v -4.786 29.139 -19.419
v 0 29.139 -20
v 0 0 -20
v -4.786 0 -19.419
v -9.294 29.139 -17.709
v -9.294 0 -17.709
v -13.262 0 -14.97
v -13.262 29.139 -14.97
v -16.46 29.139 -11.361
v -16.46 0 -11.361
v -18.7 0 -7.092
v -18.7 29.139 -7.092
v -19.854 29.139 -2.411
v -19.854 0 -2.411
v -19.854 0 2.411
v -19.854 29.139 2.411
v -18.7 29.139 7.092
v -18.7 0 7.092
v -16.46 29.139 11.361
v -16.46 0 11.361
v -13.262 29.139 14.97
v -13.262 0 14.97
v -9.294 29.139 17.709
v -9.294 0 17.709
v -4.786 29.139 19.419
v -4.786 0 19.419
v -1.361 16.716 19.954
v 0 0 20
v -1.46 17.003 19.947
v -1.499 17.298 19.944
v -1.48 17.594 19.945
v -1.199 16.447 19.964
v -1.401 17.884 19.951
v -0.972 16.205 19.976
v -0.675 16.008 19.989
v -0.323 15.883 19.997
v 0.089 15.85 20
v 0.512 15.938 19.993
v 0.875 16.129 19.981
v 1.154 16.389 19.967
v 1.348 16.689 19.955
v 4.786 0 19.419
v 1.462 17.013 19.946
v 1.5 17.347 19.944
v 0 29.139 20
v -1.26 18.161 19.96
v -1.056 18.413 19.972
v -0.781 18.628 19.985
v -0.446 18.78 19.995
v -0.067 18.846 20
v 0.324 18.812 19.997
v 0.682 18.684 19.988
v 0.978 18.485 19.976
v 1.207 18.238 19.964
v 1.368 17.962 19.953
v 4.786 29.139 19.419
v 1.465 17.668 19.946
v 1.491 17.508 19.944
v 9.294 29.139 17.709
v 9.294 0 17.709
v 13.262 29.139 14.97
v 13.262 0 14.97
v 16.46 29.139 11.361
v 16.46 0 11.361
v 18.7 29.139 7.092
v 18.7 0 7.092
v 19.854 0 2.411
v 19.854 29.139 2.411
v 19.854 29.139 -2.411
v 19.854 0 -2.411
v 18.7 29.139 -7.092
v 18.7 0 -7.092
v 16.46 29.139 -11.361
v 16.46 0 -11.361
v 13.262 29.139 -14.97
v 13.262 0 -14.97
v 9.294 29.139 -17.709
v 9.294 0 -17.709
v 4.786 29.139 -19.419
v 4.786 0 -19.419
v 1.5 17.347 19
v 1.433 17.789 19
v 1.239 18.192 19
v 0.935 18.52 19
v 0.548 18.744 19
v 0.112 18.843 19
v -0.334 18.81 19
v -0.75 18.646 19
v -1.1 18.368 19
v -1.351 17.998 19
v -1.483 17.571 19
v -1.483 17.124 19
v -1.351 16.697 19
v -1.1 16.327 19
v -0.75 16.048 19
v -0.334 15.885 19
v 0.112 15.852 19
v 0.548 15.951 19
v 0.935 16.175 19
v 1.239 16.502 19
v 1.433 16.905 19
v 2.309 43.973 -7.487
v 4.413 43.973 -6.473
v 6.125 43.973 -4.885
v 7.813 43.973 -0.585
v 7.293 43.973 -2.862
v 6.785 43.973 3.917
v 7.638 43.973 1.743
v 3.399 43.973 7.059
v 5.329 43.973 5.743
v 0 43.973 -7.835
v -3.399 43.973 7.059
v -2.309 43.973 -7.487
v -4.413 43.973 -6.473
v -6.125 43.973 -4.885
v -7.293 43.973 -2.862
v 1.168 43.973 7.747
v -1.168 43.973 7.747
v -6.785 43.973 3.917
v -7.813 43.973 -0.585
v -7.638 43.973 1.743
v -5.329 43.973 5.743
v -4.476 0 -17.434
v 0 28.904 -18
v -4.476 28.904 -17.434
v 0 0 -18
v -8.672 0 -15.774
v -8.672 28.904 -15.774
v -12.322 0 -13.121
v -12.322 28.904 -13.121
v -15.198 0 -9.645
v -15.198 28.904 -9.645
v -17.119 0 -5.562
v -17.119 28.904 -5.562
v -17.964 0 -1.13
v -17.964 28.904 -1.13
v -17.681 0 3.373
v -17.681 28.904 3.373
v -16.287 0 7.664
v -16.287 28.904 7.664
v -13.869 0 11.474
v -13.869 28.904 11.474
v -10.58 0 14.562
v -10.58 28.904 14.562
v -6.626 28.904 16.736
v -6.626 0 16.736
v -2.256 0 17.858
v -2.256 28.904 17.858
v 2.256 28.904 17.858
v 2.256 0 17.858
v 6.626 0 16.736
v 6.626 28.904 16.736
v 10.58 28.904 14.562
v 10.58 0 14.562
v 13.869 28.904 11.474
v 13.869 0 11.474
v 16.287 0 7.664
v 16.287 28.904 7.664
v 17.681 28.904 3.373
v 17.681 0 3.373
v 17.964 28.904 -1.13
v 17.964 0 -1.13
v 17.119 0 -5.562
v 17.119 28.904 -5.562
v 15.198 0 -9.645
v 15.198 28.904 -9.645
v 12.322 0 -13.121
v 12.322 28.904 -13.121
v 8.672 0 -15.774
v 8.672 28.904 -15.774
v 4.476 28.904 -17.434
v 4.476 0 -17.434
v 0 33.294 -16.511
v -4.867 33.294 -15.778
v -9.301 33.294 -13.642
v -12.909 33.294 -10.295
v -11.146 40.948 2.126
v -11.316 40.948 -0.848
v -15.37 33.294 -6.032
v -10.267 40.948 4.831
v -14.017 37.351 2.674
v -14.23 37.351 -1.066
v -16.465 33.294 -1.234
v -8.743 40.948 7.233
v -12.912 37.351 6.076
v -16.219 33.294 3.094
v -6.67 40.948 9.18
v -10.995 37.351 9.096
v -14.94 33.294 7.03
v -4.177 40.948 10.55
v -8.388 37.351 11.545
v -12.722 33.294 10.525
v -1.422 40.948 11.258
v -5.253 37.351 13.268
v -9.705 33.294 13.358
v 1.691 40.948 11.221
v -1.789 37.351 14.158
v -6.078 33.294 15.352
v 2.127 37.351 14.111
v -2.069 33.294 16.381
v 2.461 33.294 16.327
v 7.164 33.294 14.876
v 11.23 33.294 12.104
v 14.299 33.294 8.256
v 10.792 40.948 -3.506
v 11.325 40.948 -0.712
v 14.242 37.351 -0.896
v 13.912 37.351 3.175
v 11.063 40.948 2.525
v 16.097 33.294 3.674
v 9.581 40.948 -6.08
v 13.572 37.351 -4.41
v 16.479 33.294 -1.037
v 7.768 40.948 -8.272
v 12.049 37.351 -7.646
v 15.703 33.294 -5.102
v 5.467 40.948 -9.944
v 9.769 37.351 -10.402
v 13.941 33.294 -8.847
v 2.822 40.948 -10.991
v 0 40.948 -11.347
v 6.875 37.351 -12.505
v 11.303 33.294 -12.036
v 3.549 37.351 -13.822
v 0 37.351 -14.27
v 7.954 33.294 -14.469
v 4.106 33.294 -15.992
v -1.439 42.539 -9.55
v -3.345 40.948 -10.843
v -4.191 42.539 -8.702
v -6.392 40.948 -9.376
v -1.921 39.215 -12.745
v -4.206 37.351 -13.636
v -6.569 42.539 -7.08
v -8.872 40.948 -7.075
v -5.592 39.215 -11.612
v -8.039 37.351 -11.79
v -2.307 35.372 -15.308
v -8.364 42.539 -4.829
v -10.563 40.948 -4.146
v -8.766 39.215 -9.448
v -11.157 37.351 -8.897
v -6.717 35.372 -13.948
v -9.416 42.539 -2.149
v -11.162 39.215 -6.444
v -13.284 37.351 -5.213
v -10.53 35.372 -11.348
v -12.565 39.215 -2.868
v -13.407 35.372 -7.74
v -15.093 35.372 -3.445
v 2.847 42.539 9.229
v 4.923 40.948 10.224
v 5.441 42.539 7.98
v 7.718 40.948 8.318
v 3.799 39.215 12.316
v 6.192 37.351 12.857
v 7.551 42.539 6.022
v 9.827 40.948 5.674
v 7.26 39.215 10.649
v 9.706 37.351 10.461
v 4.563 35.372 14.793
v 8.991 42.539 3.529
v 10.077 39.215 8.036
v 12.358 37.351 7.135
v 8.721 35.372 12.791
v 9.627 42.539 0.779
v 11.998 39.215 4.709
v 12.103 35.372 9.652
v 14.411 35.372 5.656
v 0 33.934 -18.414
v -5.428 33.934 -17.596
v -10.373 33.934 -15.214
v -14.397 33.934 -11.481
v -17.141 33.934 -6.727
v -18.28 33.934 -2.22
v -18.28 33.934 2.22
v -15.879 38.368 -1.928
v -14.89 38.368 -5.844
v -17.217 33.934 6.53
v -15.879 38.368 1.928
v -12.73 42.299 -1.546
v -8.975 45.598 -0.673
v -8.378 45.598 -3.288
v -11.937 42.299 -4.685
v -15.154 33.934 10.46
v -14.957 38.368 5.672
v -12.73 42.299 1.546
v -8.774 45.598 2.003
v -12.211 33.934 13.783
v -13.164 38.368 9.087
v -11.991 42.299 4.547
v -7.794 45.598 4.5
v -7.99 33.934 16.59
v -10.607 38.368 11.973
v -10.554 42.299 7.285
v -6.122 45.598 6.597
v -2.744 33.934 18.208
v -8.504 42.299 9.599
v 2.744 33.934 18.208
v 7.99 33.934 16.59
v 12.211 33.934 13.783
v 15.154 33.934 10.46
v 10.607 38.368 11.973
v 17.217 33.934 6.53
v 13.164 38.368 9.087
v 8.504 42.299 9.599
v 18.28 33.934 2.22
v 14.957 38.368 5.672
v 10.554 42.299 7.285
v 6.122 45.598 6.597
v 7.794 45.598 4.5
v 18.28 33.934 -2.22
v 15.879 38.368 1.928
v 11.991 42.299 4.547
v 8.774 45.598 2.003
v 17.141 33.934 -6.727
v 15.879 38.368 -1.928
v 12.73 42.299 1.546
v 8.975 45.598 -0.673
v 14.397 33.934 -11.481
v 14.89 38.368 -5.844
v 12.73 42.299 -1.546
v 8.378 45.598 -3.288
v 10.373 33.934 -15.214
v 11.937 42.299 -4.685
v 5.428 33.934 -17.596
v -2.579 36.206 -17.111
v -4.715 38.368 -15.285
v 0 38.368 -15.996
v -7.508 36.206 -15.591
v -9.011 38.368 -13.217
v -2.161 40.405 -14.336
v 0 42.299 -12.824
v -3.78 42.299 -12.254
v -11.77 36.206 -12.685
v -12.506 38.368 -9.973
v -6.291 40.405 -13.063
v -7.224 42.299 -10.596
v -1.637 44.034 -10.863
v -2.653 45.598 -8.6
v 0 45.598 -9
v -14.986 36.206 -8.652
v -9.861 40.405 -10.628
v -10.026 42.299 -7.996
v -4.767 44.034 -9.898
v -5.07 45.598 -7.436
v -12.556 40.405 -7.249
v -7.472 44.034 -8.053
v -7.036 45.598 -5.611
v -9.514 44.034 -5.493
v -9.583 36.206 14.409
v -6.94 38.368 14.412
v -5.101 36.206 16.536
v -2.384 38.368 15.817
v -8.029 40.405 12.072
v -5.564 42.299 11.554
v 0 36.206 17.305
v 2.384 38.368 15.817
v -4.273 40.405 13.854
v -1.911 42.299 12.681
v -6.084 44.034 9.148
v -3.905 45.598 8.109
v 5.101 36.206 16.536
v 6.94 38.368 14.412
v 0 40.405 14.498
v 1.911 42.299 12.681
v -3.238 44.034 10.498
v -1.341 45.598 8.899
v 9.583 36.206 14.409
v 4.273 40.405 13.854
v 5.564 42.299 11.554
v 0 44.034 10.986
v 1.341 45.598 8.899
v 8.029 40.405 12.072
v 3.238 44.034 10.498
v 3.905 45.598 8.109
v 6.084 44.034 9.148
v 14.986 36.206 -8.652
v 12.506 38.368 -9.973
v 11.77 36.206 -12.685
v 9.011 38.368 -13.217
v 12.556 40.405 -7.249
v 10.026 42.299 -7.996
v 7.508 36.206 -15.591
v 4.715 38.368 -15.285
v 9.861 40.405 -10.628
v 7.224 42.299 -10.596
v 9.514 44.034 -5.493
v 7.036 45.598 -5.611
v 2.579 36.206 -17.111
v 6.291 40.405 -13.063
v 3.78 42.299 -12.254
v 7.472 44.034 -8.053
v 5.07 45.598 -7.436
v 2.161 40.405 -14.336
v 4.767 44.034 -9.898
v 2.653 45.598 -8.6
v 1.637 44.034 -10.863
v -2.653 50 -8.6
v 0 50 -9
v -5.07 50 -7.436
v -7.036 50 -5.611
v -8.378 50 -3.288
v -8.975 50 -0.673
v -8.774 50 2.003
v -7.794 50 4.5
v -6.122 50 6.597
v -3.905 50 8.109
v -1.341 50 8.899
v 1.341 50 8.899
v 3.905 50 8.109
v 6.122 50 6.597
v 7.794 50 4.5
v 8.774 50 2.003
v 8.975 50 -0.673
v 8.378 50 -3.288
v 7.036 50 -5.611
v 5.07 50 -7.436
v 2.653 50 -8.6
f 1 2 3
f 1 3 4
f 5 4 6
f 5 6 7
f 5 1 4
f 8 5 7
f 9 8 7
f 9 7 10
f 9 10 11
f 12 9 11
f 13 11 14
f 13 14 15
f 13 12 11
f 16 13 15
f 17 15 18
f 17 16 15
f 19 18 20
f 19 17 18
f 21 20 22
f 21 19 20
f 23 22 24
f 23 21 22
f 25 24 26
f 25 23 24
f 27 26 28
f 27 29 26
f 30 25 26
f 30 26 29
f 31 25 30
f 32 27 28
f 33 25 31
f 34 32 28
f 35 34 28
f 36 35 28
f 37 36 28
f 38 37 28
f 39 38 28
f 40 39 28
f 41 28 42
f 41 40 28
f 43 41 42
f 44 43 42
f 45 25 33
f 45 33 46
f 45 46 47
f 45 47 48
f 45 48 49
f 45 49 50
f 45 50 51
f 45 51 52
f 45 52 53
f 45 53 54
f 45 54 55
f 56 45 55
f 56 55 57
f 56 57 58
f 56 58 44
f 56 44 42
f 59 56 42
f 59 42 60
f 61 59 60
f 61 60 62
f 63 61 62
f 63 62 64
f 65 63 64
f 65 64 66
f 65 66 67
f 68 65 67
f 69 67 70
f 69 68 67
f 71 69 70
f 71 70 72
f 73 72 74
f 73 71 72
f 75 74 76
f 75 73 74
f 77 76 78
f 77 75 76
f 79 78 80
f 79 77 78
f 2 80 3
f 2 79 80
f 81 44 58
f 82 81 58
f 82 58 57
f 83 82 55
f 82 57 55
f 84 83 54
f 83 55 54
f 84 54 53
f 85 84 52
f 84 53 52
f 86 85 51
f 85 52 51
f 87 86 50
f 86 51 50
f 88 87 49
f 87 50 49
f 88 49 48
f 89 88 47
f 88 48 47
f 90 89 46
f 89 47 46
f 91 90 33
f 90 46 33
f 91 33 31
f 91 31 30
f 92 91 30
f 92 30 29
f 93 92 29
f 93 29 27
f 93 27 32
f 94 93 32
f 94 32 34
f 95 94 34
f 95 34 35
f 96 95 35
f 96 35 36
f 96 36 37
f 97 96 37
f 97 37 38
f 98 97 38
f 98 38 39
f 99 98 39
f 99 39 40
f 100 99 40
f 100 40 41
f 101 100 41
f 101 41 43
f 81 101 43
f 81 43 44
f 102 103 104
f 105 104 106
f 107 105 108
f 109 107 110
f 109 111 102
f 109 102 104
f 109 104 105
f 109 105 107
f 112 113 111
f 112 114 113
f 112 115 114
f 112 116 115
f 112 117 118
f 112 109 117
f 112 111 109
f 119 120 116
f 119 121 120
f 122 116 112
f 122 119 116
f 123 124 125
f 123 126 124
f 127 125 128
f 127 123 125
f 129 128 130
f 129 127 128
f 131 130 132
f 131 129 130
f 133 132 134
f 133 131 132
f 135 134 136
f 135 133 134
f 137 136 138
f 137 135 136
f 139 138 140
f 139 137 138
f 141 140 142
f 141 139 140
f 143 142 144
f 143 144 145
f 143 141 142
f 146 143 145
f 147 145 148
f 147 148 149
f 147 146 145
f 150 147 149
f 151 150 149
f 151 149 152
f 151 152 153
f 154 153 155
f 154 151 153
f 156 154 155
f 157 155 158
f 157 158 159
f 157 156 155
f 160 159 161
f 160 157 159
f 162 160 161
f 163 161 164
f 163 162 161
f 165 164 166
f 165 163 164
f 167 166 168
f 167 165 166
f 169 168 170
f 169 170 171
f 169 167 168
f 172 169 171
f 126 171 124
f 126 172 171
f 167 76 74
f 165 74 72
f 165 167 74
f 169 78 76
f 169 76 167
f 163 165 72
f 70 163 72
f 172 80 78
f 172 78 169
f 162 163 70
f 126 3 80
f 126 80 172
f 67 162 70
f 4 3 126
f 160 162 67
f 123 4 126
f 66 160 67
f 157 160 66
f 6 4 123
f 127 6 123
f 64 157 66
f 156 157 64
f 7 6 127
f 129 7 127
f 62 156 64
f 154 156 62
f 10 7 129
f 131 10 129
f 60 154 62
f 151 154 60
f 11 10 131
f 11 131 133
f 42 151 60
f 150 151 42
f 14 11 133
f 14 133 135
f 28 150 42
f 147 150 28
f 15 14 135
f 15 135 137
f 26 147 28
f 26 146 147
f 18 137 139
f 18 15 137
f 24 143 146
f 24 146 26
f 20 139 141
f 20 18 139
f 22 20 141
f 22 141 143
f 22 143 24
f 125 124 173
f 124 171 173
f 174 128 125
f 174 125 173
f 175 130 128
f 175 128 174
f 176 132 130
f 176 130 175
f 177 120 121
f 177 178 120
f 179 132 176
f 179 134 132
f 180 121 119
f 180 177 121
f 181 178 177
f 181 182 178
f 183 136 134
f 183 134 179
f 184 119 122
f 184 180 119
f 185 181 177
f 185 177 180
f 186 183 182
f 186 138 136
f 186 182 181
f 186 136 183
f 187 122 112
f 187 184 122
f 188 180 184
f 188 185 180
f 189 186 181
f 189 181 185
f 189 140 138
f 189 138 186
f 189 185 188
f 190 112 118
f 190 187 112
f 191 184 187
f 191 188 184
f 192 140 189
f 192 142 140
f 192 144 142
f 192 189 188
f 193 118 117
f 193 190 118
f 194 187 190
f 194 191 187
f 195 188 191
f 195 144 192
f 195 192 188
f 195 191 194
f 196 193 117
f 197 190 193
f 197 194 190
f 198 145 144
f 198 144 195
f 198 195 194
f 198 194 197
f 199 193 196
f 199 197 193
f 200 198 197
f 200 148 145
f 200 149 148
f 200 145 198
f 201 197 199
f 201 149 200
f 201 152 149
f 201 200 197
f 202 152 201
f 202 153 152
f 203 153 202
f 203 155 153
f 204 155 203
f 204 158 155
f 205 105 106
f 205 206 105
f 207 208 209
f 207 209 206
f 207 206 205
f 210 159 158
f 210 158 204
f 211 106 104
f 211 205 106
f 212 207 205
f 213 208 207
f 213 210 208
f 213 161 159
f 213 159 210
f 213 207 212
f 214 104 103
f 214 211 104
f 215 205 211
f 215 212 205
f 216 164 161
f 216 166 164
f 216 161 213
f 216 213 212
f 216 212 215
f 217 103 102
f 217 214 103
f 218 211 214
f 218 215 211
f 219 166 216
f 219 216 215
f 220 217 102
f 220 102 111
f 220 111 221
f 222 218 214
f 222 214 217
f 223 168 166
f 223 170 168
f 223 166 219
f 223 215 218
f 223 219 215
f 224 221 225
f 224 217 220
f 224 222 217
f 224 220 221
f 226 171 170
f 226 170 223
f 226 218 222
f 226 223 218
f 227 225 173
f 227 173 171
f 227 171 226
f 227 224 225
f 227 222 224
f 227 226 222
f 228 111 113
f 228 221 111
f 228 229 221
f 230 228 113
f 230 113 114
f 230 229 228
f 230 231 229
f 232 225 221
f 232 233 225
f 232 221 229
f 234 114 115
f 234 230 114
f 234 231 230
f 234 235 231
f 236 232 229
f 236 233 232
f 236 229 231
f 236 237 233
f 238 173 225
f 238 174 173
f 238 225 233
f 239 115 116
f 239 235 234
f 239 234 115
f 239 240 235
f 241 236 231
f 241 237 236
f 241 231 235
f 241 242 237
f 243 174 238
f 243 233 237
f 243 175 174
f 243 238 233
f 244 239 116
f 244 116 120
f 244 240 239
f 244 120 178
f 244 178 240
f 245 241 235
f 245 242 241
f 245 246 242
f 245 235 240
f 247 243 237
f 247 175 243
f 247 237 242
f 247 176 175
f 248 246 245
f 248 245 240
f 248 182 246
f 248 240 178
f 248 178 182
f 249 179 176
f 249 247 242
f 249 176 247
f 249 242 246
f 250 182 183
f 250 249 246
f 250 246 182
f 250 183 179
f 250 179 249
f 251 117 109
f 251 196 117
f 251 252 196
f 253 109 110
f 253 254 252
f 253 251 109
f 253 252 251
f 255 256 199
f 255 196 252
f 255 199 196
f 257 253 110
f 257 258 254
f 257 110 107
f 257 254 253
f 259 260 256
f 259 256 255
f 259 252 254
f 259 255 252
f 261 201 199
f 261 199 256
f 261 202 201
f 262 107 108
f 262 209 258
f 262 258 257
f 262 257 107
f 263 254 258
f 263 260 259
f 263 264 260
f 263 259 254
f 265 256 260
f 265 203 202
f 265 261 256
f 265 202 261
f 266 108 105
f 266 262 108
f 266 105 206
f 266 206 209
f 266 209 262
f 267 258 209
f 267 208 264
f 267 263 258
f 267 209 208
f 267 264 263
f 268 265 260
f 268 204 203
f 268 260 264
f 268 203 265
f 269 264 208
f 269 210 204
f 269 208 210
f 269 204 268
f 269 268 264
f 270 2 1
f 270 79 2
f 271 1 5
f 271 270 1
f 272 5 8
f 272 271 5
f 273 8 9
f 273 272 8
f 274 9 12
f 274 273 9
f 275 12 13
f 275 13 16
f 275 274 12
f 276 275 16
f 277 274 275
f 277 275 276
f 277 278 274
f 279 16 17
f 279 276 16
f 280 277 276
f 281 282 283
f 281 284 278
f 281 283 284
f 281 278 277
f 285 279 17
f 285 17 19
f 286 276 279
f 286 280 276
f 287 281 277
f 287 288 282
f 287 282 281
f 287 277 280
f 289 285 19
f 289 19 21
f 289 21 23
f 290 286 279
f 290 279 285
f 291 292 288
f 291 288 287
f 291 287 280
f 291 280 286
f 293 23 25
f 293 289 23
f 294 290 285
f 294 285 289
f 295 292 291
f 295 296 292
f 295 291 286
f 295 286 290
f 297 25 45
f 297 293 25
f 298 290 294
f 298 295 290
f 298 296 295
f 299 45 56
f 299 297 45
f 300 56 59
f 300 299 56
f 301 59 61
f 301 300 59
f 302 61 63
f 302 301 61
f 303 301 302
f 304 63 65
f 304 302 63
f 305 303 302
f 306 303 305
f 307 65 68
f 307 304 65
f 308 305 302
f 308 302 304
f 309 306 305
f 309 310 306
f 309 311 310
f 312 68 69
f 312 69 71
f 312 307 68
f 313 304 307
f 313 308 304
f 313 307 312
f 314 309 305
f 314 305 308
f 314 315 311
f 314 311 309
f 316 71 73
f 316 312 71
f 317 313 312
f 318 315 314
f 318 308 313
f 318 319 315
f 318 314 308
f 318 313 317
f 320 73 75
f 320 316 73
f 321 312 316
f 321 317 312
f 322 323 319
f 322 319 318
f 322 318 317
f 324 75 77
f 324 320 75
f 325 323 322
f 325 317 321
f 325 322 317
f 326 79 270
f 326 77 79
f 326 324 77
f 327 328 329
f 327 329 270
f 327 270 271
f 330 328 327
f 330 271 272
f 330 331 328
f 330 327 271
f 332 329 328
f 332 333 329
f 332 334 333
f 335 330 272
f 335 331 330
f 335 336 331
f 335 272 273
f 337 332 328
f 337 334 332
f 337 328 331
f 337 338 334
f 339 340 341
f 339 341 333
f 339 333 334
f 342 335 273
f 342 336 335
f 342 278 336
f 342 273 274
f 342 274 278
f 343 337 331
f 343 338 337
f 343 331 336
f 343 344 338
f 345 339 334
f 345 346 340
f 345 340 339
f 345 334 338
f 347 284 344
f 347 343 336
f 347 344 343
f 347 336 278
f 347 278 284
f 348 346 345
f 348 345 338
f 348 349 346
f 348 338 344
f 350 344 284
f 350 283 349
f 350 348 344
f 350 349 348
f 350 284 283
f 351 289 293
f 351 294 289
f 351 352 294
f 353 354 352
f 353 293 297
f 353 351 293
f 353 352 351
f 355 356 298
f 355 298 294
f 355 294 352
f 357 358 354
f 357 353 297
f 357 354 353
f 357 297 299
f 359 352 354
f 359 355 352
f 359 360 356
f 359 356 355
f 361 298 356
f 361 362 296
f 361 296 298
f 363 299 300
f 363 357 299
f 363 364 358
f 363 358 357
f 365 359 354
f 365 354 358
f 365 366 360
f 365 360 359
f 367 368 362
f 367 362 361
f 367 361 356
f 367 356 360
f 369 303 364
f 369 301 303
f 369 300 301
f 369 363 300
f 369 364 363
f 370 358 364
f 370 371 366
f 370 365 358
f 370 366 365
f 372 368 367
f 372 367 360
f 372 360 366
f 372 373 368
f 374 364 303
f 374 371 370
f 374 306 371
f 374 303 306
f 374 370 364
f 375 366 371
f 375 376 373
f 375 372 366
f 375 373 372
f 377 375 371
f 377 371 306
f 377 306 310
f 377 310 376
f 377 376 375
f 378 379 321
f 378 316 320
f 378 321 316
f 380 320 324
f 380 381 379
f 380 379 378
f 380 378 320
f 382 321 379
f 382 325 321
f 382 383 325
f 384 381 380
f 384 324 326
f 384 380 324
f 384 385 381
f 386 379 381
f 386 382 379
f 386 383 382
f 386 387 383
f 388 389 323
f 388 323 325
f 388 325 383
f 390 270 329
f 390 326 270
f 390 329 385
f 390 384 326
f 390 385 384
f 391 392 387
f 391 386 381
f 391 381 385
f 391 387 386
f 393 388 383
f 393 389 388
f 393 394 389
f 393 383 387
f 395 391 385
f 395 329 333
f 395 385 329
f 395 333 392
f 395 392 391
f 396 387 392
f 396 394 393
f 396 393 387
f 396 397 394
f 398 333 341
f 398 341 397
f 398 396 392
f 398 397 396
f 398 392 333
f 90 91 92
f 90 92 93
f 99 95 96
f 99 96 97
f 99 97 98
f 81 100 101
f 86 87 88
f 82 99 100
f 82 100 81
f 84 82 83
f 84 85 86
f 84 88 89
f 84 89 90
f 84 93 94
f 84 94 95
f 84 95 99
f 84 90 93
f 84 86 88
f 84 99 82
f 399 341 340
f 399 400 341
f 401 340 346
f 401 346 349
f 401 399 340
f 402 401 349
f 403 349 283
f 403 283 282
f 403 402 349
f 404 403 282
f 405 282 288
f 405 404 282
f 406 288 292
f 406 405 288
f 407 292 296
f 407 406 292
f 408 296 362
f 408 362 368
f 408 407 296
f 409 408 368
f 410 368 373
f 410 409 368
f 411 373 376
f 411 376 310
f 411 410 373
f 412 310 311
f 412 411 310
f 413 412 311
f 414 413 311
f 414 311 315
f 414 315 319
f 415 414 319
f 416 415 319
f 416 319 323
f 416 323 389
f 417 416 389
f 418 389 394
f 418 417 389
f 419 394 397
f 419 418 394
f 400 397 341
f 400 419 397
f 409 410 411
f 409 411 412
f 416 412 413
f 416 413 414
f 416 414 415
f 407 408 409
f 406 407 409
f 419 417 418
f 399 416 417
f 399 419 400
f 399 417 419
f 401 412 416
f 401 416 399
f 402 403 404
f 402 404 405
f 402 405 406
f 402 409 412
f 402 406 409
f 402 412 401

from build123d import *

# Parameters (mm, degrees)
SKETCH2_R          = 1.5
CUT_EXTRUDE1_DEPTH = 1


with BuildPart() as part:
    # Sketch1 → Revolve1 (revolve)
    with BuildSketch(Plane.XY, mode=Mode.PRIVATE) as revolve1_sk:
        with BuildLine():
            Line((20, 0), (20, 29.13905258))
            ThreePointArc((20, 29.13905258), (15.995992564, 38.368383693), (9, 45.598094362))
            Line((9, 45.598094362), (9, 50))
            Line((9, 50), (0, 50))
            Line((0, 50), (0, 43.972671684))
            Line((0, 43.972671684), (7.83466695, 43.972671684))
            ThreePointArc((7.83466695, 43.972671684), (14.270082218, 37.351024326), (18, 28.904220391))
            Line((18, 28.904220391), (18, 0))
            Line((18, 0), (20, 0))
        make_face()
    revolve(revolve1_sk.sketch.rotate(Axis((0, 0, 0), (0, 1, 0)), 90), axis=Axis((0, 0, 0), (0, 1, 0)))

    # Sketch2 → Cut-Extrude1 (cut)
    with BuildSketch(Plane.XY.offset(20)):
        with Locations((0, 17.347366398)):
            Circle(SKETCH2_R)
    extrude(amount=-CUT_EXTRUDE1_DEPTH, mode=Mode.SUBTRACT)


solid = part.part
